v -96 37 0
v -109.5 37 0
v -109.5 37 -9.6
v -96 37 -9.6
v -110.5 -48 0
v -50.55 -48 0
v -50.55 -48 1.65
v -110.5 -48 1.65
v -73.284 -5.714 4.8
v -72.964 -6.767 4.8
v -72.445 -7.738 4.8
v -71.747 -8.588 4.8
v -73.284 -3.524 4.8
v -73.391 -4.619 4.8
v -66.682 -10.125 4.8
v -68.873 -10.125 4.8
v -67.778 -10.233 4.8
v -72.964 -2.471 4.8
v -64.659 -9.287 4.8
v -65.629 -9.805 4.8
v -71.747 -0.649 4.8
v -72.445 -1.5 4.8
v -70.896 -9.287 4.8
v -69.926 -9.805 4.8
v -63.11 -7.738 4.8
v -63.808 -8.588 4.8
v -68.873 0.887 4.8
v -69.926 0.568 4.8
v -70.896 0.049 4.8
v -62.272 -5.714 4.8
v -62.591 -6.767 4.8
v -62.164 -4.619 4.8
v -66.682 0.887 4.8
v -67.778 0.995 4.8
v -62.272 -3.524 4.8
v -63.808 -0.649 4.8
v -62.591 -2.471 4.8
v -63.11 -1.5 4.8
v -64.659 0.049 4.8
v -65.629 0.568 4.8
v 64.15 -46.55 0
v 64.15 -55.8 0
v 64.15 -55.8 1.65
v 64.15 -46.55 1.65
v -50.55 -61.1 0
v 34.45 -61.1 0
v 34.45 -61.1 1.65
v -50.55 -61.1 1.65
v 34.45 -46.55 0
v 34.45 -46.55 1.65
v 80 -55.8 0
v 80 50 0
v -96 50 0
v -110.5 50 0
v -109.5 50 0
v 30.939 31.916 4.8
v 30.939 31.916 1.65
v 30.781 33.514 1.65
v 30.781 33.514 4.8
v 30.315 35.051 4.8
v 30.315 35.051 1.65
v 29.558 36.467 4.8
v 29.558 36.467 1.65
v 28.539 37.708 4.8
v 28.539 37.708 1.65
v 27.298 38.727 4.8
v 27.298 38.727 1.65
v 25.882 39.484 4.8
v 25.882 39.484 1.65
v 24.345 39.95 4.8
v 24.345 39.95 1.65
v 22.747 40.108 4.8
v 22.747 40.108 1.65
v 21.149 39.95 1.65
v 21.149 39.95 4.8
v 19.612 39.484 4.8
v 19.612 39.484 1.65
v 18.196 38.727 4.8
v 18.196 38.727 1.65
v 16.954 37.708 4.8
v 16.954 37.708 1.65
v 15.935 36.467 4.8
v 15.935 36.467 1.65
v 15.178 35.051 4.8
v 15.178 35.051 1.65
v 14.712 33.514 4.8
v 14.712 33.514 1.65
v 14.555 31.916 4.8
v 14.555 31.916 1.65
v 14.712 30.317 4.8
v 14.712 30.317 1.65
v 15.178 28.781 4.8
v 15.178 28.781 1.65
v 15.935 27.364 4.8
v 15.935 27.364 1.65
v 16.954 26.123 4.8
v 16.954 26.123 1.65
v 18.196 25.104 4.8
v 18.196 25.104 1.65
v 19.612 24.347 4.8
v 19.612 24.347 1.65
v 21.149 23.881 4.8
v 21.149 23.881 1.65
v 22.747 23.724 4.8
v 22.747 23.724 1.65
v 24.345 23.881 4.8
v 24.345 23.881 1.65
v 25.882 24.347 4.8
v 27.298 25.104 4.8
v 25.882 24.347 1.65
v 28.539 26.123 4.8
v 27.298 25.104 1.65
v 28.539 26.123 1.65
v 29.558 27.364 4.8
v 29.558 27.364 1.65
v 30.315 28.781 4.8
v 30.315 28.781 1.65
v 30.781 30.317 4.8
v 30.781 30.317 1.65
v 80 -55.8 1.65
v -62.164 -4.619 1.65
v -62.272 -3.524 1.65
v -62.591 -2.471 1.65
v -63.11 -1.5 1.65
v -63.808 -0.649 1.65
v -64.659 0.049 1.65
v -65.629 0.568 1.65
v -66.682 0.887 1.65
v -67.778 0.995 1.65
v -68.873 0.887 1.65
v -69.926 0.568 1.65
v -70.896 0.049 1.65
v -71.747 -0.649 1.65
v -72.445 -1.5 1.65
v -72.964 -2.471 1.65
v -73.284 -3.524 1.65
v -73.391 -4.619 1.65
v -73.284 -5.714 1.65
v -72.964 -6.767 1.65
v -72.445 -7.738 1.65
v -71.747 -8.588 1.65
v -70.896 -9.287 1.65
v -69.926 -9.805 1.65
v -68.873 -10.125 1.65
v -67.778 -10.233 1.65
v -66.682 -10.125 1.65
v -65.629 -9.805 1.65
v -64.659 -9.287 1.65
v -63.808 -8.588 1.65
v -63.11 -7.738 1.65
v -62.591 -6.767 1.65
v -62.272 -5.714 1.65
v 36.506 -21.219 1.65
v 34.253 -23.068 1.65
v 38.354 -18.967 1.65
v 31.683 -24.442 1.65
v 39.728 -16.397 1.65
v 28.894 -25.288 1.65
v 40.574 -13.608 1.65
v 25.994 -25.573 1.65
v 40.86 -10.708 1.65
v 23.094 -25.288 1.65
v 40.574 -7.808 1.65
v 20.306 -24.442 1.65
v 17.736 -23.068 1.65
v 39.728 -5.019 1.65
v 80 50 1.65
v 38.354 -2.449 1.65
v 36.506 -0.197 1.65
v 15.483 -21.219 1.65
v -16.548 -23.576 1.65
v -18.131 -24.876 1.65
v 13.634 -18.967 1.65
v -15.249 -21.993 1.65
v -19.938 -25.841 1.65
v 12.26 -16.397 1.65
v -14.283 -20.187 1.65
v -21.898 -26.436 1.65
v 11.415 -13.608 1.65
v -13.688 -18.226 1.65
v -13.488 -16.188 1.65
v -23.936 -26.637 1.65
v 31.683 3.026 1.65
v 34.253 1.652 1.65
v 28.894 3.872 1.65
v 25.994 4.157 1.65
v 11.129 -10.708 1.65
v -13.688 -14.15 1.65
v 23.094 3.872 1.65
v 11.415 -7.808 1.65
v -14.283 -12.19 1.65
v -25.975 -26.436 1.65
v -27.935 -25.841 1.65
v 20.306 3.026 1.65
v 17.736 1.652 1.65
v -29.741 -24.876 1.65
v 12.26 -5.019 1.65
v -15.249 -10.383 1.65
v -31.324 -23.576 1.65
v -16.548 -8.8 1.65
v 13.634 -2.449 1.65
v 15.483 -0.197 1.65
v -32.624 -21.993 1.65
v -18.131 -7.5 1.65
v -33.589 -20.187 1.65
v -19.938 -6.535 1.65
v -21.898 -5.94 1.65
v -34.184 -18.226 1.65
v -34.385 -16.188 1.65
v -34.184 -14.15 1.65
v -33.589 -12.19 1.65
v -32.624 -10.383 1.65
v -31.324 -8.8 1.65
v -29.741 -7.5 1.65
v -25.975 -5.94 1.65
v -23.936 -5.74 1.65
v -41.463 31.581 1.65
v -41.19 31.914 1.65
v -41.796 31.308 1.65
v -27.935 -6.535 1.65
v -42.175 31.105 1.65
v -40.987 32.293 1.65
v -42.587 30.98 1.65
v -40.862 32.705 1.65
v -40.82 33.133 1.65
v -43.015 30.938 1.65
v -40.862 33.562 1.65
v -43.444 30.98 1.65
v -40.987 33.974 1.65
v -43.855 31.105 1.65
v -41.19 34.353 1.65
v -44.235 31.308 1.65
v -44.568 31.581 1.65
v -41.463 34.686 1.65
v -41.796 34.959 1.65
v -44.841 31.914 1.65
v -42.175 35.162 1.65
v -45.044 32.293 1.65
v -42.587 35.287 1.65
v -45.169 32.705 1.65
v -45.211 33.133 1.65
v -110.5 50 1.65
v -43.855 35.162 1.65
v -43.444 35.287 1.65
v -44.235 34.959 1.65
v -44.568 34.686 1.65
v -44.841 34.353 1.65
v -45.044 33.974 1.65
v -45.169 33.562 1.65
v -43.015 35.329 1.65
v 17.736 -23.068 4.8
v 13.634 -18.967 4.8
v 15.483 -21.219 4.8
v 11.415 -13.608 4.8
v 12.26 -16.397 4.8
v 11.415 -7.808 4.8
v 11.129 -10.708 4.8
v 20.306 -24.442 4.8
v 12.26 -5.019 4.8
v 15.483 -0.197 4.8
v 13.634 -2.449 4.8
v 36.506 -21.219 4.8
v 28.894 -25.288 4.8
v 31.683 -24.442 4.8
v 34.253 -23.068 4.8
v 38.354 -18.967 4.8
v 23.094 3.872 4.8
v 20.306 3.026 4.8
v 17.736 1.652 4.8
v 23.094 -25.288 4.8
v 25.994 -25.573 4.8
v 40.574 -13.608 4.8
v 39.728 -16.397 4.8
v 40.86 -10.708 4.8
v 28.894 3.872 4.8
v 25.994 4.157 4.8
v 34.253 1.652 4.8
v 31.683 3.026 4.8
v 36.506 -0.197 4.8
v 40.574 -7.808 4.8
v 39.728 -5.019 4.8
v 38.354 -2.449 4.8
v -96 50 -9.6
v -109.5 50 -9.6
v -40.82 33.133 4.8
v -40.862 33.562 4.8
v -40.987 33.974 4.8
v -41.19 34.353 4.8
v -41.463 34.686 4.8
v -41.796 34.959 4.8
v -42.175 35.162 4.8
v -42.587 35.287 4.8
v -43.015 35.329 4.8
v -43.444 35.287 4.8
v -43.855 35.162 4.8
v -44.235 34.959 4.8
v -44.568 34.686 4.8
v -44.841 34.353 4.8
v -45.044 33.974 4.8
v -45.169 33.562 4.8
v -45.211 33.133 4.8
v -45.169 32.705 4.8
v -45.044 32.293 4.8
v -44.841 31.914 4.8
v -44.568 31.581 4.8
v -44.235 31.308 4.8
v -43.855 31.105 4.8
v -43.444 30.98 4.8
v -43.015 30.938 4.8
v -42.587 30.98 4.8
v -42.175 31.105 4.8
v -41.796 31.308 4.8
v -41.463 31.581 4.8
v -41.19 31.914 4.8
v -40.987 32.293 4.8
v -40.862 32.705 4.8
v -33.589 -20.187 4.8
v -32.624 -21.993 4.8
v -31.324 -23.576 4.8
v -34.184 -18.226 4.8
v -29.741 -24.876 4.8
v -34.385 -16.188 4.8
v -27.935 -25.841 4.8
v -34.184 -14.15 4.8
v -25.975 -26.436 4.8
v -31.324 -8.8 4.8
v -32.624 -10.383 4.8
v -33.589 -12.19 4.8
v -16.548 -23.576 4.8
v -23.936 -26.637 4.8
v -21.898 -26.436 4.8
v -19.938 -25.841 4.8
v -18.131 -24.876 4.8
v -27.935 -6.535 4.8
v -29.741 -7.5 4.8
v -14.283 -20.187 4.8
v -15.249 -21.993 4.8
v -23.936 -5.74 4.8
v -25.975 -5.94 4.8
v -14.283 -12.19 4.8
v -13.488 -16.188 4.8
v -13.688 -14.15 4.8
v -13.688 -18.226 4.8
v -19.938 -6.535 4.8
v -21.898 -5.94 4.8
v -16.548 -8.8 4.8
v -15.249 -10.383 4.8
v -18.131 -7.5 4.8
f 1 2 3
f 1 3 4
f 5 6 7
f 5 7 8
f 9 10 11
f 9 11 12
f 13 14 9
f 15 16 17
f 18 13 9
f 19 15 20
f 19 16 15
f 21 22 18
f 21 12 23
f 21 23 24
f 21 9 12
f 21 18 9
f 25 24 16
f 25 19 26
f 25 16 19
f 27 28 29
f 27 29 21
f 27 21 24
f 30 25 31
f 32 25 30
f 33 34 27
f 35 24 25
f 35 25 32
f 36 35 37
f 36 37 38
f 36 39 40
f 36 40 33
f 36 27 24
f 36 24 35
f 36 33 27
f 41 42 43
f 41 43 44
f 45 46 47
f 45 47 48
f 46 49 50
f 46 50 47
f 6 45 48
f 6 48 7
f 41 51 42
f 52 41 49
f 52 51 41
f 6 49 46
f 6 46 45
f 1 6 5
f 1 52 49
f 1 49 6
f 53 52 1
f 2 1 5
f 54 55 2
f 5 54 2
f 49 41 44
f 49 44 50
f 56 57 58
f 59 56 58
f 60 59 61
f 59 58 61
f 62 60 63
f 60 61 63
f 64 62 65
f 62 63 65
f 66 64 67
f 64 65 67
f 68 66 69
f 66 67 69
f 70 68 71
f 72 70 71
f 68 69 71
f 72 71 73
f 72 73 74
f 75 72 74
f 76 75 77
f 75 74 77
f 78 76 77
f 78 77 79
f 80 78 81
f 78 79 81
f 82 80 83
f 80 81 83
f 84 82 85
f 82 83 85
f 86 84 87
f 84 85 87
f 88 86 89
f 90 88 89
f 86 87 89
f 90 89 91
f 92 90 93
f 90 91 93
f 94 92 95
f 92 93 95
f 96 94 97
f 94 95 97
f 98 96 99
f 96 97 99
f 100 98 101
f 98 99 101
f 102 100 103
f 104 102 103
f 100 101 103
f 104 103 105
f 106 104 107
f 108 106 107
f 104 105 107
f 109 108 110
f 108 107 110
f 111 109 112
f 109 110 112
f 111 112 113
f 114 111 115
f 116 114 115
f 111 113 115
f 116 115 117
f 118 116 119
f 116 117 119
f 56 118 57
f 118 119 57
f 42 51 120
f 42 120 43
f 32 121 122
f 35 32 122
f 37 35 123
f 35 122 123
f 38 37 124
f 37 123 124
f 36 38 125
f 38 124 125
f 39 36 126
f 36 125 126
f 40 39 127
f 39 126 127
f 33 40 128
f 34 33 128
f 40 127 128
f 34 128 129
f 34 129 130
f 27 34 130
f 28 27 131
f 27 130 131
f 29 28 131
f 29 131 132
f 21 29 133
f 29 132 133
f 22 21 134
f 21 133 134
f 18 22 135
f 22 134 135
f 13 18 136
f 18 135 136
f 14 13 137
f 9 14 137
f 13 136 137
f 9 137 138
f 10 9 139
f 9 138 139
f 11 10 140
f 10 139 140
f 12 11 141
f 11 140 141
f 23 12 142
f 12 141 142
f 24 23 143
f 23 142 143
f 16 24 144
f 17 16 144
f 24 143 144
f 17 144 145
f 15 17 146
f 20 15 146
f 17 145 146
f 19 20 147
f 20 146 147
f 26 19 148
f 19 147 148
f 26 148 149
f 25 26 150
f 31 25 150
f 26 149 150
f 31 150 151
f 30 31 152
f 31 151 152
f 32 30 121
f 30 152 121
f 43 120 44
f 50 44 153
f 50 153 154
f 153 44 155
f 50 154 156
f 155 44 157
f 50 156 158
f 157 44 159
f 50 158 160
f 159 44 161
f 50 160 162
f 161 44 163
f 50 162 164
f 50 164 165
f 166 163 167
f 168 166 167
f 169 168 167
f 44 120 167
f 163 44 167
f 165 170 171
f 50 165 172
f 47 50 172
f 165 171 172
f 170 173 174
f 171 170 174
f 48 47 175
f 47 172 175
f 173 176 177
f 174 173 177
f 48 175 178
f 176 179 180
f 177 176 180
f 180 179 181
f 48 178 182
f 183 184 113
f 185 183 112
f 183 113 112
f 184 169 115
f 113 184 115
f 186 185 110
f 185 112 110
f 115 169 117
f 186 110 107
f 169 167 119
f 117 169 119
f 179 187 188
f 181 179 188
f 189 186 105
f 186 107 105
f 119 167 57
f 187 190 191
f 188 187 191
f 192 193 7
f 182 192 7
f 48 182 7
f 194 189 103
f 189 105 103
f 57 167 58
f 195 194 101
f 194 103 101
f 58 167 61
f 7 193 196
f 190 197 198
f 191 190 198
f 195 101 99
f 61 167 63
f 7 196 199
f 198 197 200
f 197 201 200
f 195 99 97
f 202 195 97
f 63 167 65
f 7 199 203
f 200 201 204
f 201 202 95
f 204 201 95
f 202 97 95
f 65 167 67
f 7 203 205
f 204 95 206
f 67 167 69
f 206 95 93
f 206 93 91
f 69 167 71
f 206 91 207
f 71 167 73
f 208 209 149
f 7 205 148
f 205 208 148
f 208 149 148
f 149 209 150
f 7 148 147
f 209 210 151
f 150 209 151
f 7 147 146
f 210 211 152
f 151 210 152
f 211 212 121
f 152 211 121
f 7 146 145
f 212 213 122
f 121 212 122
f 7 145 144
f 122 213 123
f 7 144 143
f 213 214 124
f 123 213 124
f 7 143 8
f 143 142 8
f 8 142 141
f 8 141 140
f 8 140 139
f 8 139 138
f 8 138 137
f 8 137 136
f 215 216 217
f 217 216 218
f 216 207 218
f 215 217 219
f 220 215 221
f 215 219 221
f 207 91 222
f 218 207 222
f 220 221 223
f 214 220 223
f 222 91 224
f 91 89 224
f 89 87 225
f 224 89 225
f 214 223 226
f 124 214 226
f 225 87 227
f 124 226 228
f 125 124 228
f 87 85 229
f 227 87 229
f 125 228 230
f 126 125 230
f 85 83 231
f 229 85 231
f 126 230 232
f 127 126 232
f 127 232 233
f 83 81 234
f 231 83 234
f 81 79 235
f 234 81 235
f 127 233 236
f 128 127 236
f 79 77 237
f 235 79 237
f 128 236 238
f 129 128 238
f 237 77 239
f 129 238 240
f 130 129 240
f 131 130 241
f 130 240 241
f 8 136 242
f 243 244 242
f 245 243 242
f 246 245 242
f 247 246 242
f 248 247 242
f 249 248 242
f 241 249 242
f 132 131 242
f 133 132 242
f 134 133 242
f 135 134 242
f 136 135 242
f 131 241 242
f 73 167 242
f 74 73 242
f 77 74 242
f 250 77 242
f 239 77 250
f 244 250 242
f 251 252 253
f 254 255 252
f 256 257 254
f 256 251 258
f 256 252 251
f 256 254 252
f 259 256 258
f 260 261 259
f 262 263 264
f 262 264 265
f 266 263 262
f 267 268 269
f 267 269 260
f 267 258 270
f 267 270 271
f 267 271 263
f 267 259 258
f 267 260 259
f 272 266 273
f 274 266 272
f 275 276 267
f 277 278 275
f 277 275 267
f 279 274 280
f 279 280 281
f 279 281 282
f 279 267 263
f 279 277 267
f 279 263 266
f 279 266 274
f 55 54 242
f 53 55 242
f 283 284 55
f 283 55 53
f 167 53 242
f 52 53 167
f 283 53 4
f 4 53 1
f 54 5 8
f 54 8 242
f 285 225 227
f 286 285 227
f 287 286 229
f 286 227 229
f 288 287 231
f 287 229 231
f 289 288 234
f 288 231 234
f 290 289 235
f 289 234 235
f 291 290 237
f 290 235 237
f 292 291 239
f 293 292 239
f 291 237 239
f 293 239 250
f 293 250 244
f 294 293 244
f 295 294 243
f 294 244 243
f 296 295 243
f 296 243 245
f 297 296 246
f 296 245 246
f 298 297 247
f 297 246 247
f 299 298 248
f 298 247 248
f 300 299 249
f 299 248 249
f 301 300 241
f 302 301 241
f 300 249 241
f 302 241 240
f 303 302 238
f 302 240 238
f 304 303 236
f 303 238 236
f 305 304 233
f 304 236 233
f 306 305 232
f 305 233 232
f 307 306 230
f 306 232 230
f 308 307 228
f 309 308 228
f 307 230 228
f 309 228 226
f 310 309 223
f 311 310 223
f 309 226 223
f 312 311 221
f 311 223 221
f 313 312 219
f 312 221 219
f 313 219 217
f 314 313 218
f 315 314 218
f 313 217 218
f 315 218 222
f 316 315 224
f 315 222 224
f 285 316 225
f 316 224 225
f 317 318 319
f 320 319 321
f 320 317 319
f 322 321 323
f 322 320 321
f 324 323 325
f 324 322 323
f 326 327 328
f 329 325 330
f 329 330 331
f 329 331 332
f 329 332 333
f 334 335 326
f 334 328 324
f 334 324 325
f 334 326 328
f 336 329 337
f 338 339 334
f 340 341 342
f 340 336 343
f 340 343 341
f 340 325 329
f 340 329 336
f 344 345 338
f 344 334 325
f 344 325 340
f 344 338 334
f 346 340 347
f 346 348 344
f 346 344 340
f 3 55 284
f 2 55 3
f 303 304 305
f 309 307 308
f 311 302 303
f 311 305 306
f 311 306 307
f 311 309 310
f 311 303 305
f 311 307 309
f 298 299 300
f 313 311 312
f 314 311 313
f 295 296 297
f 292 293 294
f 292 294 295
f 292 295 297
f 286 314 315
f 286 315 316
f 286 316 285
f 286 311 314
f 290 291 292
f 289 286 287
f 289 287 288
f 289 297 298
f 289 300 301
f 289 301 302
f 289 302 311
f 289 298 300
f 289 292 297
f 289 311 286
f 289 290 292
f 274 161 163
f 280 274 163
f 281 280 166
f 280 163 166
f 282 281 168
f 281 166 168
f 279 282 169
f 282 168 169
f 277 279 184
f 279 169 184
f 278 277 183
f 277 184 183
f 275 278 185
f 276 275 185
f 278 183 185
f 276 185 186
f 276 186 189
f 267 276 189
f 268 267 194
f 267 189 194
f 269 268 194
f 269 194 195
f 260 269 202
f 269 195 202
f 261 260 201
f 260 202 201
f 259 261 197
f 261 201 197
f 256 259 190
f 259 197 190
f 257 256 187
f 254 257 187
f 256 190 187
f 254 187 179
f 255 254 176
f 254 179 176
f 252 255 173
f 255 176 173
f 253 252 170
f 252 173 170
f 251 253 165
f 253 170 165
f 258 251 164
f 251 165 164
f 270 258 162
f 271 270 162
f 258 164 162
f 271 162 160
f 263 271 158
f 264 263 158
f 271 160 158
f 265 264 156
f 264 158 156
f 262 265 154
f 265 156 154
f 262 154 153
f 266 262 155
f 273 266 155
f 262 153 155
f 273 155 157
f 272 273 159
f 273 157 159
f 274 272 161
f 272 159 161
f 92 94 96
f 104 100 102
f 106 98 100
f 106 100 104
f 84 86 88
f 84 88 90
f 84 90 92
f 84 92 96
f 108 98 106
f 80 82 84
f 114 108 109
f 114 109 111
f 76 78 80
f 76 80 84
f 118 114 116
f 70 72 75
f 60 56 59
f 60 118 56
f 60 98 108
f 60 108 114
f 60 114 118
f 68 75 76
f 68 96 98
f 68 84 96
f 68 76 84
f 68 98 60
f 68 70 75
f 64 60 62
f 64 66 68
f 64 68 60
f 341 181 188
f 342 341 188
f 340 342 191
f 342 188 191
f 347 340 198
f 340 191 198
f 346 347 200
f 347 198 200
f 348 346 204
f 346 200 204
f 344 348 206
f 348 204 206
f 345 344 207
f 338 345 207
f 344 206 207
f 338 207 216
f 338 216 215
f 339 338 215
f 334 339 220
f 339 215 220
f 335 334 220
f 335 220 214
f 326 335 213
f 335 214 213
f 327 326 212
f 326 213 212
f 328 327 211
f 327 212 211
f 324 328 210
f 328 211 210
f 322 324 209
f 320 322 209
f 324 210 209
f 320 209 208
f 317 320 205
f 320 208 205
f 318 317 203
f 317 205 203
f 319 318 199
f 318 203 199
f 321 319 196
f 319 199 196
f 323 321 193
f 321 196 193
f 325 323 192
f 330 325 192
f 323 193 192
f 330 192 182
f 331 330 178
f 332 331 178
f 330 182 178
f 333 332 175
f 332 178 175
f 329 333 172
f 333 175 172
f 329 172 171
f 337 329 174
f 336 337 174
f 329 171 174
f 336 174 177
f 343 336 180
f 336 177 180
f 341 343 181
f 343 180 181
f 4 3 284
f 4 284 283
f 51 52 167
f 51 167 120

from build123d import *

# Parameters (mm, degrees)
PAD_DEPTH     = 1.65
SKETCH001_R   = 2.195453
SKETCH001_R_2 = 8.192022
SKETCH001_R_3 = 5.613861
SKETCH001_R_4 = 14.865337
SKETCH001_R_5 = 10.448492
PAD001_DEPTH  = 3.15
SKETCH002_W   = 13.5
SKETCH002_H   = 13
PAD002_DEPTH  = 9.6


with BuildPart() as part:
    # Sketch → Pad (new body)
    with BuildSketch(Plane.XY):
        Polygon((-110.5, 50), (80, 50), (80, -55.8), (64.15, -55.8), (64.15, -46.55), (34.45, -46.55), (34.45, -61.1), (-50.55, -61.1), (-50.55, -48), (-110.5, -48), align=None)
    extrude(amount=PAD_DEPTH)

    # Sketch001 (on Face12 of Pad) → Pad001 (join)
    with BuildSketch(Plane.XY.offset(1.65)):
        with Locations((-43.015316, 33.133453)):
            Circle(SKETCH001_R)
        with Locations((22.746756, 31.915638)):
            Circle(SKETCH001_R_2)
        with Locations((-67.77758, -4.618844)):
            Circle(SKETCH001_R_3)
        with Locations((25.994263, -10.707931)):
            Circle(SKETCH001_R_4)
        with Locations((-23.936199, -16.188095)):
            Circle(SKETCH001_R_5)
    extrude(amount=PAD001_DEPTH)

    # Sketch002 (on Face4 of Pad001) → Pad002 (join)
    with BuildSketch(Plane(origin=(0, 0, 0), x_dir=(1, 0, 0), z_dir=(0, 0, -1))):
        with Locations((-102.75, -43.5)):
            Rectangle(SKETCH002_W, SKETCH002_H)
    extrude(amount=PAD002_DEPTH)


solid = part.part
